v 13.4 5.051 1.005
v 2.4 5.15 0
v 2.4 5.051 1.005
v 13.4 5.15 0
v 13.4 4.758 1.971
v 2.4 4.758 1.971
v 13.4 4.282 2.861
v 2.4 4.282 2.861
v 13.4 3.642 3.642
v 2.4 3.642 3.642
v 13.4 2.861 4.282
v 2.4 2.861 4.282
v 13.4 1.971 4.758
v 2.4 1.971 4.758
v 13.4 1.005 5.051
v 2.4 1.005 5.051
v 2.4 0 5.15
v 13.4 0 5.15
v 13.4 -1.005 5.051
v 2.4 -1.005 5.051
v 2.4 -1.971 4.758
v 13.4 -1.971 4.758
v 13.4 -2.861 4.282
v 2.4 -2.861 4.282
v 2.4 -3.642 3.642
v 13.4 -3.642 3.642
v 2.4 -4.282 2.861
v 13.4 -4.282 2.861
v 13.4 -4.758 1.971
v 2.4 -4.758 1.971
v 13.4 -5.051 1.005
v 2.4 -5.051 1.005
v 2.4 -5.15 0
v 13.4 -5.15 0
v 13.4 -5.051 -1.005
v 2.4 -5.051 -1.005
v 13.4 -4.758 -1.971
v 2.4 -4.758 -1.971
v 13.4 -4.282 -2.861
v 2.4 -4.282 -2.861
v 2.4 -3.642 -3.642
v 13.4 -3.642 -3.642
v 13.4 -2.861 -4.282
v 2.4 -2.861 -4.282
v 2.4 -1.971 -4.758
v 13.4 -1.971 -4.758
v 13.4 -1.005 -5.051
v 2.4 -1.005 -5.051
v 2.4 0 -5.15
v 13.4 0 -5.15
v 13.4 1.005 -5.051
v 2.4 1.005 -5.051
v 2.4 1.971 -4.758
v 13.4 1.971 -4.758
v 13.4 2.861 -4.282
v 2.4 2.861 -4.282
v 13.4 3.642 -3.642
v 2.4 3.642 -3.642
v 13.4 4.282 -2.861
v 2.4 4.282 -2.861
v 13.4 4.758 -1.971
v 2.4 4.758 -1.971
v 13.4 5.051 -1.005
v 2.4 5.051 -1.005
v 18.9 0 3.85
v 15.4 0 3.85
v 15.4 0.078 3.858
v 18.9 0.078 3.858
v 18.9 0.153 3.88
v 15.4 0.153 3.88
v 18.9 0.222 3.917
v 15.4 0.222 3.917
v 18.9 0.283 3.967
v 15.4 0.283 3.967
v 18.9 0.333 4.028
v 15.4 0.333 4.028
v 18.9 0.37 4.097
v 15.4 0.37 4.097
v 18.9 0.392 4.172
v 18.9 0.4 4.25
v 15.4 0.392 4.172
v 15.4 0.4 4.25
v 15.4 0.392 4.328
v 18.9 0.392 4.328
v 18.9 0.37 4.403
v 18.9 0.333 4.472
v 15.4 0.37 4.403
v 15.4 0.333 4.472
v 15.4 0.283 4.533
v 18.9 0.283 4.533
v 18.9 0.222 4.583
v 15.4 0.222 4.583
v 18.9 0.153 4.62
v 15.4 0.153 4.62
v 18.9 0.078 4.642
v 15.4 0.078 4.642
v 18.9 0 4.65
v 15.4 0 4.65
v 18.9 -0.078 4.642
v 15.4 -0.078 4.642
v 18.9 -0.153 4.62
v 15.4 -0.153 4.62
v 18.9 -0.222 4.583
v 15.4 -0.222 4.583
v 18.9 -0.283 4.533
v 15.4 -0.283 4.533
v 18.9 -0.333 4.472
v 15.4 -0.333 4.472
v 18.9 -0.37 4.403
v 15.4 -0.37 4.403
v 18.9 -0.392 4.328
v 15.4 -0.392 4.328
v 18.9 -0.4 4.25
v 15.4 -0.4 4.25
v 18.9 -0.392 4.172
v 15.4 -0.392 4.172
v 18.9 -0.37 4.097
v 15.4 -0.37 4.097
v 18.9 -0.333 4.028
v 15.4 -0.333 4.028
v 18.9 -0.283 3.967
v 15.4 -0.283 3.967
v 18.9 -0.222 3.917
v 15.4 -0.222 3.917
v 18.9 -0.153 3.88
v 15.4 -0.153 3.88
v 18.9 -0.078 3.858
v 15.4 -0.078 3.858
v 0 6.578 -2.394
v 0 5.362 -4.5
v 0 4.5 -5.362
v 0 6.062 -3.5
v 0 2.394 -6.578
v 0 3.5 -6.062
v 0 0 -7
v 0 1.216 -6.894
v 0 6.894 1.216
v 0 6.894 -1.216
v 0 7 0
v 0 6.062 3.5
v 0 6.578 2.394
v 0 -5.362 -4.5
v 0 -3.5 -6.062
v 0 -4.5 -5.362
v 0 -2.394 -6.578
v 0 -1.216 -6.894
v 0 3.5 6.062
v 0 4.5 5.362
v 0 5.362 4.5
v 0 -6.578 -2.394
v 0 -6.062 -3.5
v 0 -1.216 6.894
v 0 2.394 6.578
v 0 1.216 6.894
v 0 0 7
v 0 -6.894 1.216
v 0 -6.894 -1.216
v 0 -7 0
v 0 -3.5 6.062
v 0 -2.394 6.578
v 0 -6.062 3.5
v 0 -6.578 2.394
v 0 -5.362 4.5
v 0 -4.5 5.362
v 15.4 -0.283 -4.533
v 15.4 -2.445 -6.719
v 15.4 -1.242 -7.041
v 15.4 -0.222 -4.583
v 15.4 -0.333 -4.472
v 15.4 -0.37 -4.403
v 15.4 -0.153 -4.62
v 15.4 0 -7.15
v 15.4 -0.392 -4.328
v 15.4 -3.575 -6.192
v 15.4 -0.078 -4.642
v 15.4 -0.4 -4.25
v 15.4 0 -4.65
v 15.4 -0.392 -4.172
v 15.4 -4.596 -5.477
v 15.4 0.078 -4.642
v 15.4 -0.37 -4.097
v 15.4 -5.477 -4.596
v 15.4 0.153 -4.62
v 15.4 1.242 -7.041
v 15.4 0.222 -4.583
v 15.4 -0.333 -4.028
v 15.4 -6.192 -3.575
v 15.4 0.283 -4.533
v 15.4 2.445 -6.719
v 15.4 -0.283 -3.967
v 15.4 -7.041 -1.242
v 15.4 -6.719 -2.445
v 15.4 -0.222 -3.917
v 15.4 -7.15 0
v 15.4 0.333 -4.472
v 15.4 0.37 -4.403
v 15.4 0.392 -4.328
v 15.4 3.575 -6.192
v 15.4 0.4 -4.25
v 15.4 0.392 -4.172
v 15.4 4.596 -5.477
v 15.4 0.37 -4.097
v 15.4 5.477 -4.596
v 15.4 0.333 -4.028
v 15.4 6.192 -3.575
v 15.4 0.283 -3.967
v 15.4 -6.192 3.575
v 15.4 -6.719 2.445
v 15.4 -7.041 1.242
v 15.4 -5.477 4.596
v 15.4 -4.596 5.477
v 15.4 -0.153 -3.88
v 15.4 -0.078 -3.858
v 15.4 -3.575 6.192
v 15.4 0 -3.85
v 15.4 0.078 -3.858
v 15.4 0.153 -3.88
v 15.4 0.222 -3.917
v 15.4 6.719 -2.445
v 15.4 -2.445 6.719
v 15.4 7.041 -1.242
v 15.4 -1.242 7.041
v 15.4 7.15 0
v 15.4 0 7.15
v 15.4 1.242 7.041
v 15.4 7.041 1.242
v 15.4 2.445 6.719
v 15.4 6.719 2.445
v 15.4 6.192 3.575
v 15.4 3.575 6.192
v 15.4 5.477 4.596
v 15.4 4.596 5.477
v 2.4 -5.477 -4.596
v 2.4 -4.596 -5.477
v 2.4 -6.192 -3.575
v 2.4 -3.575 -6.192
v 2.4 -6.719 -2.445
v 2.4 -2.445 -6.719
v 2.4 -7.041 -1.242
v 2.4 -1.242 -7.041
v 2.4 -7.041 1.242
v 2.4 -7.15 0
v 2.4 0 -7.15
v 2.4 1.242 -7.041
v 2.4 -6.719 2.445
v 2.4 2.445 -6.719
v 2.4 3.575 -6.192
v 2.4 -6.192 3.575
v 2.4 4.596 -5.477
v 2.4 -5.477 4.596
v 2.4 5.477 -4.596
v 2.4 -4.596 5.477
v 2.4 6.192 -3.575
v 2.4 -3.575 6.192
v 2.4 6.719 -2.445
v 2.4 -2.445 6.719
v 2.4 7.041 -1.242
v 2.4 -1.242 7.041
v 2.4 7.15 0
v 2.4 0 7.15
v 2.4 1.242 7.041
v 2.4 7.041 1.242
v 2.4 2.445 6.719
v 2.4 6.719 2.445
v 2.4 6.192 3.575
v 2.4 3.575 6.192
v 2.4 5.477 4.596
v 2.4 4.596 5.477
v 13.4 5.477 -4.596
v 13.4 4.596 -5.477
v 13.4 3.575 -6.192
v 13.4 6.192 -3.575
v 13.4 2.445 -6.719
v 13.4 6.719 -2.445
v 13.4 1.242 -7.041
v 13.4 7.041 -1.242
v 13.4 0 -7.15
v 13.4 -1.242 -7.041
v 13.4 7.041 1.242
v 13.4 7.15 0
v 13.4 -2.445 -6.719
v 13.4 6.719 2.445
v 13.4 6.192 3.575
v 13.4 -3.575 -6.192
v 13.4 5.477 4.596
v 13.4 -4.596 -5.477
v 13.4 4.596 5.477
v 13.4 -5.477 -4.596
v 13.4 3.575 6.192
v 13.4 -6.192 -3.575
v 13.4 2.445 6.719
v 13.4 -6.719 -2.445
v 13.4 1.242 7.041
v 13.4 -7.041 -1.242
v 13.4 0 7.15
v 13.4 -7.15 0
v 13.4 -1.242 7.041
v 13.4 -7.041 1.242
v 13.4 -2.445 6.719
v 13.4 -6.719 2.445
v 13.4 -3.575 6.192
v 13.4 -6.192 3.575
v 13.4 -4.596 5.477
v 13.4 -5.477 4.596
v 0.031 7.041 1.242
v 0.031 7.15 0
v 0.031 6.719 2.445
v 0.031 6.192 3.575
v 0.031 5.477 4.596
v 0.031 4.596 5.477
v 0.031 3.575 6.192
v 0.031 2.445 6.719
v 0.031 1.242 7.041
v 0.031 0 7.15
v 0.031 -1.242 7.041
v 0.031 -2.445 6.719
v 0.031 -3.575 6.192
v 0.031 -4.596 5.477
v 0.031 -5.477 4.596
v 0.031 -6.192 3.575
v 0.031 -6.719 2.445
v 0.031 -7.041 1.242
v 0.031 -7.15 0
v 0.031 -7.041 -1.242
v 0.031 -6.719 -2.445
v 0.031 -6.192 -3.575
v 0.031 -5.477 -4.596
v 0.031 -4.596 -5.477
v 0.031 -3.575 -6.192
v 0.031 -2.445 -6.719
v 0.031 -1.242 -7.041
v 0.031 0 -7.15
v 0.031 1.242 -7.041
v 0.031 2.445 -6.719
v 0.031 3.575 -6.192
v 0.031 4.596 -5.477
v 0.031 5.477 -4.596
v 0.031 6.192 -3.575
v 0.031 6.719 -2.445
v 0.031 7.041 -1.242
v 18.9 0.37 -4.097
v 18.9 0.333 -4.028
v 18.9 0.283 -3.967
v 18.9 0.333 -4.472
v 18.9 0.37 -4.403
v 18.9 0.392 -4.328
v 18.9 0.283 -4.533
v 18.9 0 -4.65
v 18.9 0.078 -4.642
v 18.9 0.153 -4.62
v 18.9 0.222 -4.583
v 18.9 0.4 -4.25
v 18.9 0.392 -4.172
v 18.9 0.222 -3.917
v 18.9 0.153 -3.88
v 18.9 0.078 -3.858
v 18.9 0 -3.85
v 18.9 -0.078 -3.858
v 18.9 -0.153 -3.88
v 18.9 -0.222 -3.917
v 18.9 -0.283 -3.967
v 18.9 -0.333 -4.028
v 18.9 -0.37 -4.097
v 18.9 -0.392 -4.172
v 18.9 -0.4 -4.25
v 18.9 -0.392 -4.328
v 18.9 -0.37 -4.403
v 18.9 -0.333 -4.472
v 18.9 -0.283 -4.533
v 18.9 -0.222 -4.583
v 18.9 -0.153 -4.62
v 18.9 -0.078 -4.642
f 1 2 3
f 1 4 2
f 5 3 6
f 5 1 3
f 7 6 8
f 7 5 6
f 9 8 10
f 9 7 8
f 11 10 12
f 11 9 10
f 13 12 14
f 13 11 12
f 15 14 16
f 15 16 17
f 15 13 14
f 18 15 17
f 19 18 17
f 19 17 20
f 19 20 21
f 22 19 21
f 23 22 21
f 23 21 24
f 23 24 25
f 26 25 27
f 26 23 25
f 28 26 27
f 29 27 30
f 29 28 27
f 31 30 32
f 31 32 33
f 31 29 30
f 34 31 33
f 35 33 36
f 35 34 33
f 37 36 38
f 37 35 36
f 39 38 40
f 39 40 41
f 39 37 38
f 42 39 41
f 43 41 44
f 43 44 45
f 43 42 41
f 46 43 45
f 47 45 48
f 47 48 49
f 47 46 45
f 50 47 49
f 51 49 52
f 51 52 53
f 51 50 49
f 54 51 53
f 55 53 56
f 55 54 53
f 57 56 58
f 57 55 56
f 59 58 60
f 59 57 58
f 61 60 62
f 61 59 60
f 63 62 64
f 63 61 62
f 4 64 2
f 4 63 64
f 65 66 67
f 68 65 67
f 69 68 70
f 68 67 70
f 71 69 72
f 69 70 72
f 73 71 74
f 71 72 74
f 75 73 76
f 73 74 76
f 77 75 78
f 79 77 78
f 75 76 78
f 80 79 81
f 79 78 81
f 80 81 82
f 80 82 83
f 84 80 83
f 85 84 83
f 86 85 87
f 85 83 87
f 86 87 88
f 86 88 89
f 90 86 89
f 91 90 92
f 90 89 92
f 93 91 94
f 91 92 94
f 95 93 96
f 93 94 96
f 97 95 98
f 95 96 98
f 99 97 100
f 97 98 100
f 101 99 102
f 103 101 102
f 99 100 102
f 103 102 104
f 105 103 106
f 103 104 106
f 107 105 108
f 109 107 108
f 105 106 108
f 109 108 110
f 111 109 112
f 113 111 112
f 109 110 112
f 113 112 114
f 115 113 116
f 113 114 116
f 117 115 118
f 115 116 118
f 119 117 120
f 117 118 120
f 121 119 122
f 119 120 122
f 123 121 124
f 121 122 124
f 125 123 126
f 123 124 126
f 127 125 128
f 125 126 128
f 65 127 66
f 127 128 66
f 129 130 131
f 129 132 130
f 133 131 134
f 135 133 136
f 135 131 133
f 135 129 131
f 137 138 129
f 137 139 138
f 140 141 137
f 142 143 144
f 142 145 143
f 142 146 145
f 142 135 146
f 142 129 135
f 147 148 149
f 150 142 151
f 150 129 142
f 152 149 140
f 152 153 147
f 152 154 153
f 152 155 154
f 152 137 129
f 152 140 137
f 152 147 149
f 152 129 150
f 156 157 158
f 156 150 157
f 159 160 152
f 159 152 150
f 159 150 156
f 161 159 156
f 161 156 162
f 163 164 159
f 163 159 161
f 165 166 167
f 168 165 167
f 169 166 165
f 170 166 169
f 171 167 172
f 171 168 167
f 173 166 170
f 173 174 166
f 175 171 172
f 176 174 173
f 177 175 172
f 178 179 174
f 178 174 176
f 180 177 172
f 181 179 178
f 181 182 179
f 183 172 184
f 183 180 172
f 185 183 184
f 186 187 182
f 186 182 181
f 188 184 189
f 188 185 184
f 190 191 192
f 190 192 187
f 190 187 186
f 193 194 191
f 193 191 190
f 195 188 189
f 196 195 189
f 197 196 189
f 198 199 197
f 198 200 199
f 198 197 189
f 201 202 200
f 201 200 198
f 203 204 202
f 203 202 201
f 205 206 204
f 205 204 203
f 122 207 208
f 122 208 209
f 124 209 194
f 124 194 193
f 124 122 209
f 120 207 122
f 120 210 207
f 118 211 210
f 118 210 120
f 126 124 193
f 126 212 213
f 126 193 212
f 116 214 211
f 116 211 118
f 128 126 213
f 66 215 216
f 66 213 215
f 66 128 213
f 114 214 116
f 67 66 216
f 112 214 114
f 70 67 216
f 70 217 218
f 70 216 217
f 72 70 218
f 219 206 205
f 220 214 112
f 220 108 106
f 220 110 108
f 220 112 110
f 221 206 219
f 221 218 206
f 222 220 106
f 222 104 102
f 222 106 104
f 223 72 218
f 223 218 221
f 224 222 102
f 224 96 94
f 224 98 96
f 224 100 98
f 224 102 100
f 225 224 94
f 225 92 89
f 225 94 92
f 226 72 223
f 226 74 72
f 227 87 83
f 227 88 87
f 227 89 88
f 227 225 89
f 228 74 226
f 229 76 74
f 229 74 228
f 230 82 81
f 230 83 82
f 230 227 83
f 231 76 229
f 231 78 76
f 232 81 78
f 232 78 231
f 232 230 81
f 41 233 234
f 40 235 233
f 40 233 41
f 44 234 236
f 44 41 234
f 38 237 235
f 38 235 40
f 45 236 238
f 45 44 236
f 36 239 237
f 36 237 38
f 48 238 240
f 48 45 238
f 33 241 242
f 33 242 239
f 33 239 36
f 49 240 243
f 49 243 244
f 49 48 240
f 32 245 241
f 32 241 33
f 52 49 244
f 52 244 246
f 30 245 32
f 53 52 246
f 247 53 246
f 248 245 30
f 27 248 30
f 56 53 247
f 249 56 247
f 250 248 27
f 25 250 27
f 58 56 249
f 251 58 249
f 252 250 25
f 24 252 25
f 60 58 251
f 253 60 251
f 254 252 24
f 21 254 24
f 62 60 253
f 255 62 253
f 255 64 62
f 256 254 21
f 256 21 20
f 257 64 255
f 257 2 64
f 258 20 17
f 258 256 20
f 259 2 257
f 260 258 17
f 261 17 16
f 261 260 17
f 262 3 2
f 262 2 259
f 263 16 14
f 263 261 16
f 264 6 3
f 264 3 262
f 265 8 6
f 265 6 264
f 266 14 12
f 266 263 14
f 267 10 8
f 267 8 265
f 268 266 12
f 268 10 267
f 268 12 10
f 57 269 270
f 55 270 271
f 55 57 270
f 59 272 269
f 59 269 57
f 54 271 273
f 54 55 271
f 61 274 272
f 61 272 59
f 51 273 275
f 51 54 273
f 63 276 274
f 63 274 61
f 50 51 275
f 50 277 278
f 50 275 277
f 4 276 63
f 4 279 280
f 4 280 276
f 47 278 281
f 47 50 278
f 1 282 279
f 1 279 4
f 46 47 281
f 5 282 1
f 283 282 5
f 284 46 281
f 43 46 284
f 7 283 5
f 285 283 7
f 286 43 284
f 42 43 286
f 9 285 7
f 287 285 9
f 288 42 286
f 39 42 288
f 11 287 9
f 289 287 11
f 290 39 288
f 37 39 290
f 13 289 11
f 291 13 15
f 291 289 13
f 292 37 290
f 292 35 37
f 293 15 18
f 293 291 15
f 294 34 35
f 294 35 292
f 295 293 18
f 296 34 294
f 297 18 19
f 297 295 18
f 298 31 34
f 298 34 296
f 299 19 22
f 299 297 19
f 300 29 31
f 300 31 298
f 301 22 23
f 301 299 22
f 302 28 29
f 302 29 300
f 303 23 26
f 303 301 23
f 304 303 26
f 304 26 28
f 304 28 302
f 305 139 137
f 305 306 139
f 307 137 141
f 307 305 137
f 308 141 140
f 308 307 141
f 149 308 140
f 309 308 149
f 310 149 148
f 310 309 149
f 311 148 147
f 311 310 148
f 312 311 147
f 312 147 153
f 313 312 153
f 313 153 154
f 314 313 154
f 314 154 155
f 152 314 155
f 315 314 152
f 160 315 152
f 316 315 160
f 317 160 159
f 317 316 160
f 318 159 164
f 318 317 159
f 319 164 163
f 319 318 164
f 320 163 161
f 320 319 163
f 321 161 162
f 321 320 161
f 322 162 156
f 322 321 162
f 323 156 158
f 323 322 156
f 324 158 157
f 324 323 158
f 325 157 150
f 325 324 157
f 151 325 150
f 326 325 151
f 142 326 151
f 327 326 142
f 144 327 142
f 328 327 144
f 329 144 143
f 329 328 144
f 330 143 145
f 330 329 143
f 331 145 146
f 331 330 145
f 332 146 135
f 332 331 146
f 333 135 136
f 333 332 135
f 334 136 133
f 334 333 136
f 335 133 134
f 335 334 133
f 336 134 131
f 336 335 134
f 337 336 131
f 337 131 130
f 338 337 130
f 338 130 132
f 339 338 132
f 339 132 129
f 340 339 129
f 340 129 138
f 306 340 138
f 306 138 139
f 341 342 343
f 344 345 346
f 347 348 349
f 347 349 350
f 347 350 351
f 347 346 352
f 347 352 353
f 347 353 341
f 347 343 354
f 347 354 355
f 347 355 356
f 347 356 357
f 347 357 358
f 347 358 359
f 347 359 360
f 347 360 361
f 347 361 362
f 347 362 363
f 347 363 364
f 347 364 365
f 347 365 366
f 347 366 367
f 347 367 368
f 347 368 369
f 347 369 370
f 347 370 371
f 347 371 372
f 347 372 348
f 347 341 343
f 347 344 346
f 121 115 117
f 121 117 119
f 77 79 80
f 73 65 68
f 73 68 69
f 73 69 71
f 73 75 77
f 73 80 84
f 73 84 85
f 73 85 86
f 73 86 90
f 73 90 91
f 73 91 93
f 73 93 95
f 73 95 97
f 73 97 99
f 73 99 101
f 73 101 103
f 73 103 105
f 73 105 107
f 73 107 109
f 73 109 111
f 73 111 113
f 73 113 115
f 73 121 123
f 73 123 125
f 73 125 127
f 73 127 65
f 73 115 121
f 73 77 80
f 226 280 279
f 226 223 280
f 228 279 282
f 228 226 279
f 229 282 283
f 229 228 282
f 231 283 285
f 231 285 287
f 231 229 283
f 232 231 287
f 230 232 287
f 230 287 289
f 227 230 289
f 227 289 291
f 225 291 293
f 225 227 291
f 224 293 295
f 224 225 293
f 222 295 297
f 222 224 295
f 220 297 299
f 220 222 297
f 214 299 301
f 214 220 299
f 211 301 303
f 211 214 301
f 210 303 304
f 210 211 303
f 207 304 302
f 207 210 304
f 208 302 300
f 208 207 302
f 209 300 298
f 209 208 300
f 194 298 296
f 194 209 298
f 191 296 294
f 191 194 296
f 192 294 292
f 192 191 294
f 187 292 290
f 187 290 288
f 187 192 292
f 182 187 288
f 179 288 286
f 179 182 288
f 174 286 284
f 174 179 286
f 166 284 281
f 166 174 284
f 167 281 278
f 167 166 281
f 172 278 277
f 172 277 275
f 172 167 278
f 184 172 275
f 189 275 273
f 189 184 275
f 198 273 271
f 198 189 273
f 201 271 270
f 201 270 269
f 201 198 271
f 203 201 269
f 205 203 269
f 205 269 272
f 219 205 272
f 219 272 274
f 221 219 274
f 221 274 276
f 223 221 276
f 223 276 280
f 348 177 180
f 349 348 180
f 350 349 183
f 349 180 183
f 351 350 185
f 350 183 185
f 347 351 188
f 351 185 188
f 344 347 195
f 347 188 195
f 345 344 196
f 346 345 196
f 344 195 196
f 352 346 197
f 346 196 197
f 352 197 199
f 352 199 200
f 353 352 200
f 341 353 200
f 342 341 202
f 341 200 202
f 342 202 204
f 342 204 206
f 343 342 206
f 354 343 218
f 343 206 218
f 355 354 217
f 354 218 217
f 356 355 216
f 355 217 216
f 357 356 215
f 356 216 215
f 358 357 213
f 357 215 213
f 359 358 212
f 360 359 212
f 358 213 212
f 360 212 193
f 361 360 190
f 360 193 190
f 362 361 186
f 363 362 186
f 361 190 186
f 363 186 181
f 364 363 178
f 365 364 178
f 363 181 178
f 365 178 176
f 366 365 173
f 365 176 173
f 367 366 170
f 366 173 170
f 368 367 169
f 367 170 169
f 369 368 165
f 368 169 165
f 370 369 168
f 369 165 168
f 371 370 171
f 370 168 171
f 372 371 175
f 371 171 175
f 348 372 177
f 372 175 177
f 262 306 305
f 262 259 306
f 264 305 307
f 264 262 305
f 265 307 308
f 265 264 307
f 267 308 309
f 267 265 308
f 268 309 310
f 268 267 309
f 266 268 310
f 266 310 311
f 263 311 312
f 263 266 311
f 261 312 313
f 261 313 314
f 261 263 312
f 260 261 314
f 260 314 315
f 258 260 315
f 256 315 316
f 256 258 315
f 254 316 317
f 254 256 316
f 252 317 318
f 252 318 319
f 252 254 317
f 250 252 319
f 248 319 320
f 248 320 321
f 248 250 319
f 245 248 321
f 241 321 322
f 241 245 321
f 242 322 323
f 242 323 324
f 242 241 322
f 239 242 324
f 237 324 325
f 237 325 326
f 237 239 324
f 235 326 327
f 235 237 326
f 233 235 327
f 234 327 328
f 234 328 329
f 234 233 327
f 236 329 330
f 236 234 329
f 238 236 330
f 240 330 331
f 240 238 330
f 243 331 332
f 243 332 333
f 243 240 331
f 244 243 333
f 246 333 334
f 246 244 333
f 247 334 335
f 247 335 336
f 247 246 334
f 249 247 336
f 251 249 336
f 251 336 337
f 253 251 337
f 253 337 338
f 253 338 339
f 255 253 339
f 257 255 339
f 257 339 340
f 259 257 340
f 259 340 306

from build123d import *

# Parameters (mm, degrees)
SKETCH_2_R      = 0.4
EXTRUDE_1_DEPTH = 3.5


with BuildPart() as part:
    # Эскиз1 → Повернуть1 (revolve)
    with BuildSketch(Plane.XY):
        Polygon((0, 0), (0, 7), (0.031301632, 7.15), (2.4, 7.15), (2.4, 5.15), (13.4, 5.15), (13.4, 7.15), (15.4, 7.15), (15.4, 0), align=None)
    revolve(axis=Axis((-29.538793103, 0, 0), (1, 0, 0)))

    # Эскиз2 → Бобышка-Вытянуть1 (add)
    with BuildSketch(Plane(origin=(15.4, 0, 0), x_dir=(0, 0, -1), z_dir=(1, 0, 0))):
        with Locations((-4.25, 0)):
            Circle(SKETCH_2_R)
        with Locations((4.25, 0)):
            Circle(SKETCH_2_R)
    extrude(amount=EXTRUDE_1_DEPTH)


solid = part.part
